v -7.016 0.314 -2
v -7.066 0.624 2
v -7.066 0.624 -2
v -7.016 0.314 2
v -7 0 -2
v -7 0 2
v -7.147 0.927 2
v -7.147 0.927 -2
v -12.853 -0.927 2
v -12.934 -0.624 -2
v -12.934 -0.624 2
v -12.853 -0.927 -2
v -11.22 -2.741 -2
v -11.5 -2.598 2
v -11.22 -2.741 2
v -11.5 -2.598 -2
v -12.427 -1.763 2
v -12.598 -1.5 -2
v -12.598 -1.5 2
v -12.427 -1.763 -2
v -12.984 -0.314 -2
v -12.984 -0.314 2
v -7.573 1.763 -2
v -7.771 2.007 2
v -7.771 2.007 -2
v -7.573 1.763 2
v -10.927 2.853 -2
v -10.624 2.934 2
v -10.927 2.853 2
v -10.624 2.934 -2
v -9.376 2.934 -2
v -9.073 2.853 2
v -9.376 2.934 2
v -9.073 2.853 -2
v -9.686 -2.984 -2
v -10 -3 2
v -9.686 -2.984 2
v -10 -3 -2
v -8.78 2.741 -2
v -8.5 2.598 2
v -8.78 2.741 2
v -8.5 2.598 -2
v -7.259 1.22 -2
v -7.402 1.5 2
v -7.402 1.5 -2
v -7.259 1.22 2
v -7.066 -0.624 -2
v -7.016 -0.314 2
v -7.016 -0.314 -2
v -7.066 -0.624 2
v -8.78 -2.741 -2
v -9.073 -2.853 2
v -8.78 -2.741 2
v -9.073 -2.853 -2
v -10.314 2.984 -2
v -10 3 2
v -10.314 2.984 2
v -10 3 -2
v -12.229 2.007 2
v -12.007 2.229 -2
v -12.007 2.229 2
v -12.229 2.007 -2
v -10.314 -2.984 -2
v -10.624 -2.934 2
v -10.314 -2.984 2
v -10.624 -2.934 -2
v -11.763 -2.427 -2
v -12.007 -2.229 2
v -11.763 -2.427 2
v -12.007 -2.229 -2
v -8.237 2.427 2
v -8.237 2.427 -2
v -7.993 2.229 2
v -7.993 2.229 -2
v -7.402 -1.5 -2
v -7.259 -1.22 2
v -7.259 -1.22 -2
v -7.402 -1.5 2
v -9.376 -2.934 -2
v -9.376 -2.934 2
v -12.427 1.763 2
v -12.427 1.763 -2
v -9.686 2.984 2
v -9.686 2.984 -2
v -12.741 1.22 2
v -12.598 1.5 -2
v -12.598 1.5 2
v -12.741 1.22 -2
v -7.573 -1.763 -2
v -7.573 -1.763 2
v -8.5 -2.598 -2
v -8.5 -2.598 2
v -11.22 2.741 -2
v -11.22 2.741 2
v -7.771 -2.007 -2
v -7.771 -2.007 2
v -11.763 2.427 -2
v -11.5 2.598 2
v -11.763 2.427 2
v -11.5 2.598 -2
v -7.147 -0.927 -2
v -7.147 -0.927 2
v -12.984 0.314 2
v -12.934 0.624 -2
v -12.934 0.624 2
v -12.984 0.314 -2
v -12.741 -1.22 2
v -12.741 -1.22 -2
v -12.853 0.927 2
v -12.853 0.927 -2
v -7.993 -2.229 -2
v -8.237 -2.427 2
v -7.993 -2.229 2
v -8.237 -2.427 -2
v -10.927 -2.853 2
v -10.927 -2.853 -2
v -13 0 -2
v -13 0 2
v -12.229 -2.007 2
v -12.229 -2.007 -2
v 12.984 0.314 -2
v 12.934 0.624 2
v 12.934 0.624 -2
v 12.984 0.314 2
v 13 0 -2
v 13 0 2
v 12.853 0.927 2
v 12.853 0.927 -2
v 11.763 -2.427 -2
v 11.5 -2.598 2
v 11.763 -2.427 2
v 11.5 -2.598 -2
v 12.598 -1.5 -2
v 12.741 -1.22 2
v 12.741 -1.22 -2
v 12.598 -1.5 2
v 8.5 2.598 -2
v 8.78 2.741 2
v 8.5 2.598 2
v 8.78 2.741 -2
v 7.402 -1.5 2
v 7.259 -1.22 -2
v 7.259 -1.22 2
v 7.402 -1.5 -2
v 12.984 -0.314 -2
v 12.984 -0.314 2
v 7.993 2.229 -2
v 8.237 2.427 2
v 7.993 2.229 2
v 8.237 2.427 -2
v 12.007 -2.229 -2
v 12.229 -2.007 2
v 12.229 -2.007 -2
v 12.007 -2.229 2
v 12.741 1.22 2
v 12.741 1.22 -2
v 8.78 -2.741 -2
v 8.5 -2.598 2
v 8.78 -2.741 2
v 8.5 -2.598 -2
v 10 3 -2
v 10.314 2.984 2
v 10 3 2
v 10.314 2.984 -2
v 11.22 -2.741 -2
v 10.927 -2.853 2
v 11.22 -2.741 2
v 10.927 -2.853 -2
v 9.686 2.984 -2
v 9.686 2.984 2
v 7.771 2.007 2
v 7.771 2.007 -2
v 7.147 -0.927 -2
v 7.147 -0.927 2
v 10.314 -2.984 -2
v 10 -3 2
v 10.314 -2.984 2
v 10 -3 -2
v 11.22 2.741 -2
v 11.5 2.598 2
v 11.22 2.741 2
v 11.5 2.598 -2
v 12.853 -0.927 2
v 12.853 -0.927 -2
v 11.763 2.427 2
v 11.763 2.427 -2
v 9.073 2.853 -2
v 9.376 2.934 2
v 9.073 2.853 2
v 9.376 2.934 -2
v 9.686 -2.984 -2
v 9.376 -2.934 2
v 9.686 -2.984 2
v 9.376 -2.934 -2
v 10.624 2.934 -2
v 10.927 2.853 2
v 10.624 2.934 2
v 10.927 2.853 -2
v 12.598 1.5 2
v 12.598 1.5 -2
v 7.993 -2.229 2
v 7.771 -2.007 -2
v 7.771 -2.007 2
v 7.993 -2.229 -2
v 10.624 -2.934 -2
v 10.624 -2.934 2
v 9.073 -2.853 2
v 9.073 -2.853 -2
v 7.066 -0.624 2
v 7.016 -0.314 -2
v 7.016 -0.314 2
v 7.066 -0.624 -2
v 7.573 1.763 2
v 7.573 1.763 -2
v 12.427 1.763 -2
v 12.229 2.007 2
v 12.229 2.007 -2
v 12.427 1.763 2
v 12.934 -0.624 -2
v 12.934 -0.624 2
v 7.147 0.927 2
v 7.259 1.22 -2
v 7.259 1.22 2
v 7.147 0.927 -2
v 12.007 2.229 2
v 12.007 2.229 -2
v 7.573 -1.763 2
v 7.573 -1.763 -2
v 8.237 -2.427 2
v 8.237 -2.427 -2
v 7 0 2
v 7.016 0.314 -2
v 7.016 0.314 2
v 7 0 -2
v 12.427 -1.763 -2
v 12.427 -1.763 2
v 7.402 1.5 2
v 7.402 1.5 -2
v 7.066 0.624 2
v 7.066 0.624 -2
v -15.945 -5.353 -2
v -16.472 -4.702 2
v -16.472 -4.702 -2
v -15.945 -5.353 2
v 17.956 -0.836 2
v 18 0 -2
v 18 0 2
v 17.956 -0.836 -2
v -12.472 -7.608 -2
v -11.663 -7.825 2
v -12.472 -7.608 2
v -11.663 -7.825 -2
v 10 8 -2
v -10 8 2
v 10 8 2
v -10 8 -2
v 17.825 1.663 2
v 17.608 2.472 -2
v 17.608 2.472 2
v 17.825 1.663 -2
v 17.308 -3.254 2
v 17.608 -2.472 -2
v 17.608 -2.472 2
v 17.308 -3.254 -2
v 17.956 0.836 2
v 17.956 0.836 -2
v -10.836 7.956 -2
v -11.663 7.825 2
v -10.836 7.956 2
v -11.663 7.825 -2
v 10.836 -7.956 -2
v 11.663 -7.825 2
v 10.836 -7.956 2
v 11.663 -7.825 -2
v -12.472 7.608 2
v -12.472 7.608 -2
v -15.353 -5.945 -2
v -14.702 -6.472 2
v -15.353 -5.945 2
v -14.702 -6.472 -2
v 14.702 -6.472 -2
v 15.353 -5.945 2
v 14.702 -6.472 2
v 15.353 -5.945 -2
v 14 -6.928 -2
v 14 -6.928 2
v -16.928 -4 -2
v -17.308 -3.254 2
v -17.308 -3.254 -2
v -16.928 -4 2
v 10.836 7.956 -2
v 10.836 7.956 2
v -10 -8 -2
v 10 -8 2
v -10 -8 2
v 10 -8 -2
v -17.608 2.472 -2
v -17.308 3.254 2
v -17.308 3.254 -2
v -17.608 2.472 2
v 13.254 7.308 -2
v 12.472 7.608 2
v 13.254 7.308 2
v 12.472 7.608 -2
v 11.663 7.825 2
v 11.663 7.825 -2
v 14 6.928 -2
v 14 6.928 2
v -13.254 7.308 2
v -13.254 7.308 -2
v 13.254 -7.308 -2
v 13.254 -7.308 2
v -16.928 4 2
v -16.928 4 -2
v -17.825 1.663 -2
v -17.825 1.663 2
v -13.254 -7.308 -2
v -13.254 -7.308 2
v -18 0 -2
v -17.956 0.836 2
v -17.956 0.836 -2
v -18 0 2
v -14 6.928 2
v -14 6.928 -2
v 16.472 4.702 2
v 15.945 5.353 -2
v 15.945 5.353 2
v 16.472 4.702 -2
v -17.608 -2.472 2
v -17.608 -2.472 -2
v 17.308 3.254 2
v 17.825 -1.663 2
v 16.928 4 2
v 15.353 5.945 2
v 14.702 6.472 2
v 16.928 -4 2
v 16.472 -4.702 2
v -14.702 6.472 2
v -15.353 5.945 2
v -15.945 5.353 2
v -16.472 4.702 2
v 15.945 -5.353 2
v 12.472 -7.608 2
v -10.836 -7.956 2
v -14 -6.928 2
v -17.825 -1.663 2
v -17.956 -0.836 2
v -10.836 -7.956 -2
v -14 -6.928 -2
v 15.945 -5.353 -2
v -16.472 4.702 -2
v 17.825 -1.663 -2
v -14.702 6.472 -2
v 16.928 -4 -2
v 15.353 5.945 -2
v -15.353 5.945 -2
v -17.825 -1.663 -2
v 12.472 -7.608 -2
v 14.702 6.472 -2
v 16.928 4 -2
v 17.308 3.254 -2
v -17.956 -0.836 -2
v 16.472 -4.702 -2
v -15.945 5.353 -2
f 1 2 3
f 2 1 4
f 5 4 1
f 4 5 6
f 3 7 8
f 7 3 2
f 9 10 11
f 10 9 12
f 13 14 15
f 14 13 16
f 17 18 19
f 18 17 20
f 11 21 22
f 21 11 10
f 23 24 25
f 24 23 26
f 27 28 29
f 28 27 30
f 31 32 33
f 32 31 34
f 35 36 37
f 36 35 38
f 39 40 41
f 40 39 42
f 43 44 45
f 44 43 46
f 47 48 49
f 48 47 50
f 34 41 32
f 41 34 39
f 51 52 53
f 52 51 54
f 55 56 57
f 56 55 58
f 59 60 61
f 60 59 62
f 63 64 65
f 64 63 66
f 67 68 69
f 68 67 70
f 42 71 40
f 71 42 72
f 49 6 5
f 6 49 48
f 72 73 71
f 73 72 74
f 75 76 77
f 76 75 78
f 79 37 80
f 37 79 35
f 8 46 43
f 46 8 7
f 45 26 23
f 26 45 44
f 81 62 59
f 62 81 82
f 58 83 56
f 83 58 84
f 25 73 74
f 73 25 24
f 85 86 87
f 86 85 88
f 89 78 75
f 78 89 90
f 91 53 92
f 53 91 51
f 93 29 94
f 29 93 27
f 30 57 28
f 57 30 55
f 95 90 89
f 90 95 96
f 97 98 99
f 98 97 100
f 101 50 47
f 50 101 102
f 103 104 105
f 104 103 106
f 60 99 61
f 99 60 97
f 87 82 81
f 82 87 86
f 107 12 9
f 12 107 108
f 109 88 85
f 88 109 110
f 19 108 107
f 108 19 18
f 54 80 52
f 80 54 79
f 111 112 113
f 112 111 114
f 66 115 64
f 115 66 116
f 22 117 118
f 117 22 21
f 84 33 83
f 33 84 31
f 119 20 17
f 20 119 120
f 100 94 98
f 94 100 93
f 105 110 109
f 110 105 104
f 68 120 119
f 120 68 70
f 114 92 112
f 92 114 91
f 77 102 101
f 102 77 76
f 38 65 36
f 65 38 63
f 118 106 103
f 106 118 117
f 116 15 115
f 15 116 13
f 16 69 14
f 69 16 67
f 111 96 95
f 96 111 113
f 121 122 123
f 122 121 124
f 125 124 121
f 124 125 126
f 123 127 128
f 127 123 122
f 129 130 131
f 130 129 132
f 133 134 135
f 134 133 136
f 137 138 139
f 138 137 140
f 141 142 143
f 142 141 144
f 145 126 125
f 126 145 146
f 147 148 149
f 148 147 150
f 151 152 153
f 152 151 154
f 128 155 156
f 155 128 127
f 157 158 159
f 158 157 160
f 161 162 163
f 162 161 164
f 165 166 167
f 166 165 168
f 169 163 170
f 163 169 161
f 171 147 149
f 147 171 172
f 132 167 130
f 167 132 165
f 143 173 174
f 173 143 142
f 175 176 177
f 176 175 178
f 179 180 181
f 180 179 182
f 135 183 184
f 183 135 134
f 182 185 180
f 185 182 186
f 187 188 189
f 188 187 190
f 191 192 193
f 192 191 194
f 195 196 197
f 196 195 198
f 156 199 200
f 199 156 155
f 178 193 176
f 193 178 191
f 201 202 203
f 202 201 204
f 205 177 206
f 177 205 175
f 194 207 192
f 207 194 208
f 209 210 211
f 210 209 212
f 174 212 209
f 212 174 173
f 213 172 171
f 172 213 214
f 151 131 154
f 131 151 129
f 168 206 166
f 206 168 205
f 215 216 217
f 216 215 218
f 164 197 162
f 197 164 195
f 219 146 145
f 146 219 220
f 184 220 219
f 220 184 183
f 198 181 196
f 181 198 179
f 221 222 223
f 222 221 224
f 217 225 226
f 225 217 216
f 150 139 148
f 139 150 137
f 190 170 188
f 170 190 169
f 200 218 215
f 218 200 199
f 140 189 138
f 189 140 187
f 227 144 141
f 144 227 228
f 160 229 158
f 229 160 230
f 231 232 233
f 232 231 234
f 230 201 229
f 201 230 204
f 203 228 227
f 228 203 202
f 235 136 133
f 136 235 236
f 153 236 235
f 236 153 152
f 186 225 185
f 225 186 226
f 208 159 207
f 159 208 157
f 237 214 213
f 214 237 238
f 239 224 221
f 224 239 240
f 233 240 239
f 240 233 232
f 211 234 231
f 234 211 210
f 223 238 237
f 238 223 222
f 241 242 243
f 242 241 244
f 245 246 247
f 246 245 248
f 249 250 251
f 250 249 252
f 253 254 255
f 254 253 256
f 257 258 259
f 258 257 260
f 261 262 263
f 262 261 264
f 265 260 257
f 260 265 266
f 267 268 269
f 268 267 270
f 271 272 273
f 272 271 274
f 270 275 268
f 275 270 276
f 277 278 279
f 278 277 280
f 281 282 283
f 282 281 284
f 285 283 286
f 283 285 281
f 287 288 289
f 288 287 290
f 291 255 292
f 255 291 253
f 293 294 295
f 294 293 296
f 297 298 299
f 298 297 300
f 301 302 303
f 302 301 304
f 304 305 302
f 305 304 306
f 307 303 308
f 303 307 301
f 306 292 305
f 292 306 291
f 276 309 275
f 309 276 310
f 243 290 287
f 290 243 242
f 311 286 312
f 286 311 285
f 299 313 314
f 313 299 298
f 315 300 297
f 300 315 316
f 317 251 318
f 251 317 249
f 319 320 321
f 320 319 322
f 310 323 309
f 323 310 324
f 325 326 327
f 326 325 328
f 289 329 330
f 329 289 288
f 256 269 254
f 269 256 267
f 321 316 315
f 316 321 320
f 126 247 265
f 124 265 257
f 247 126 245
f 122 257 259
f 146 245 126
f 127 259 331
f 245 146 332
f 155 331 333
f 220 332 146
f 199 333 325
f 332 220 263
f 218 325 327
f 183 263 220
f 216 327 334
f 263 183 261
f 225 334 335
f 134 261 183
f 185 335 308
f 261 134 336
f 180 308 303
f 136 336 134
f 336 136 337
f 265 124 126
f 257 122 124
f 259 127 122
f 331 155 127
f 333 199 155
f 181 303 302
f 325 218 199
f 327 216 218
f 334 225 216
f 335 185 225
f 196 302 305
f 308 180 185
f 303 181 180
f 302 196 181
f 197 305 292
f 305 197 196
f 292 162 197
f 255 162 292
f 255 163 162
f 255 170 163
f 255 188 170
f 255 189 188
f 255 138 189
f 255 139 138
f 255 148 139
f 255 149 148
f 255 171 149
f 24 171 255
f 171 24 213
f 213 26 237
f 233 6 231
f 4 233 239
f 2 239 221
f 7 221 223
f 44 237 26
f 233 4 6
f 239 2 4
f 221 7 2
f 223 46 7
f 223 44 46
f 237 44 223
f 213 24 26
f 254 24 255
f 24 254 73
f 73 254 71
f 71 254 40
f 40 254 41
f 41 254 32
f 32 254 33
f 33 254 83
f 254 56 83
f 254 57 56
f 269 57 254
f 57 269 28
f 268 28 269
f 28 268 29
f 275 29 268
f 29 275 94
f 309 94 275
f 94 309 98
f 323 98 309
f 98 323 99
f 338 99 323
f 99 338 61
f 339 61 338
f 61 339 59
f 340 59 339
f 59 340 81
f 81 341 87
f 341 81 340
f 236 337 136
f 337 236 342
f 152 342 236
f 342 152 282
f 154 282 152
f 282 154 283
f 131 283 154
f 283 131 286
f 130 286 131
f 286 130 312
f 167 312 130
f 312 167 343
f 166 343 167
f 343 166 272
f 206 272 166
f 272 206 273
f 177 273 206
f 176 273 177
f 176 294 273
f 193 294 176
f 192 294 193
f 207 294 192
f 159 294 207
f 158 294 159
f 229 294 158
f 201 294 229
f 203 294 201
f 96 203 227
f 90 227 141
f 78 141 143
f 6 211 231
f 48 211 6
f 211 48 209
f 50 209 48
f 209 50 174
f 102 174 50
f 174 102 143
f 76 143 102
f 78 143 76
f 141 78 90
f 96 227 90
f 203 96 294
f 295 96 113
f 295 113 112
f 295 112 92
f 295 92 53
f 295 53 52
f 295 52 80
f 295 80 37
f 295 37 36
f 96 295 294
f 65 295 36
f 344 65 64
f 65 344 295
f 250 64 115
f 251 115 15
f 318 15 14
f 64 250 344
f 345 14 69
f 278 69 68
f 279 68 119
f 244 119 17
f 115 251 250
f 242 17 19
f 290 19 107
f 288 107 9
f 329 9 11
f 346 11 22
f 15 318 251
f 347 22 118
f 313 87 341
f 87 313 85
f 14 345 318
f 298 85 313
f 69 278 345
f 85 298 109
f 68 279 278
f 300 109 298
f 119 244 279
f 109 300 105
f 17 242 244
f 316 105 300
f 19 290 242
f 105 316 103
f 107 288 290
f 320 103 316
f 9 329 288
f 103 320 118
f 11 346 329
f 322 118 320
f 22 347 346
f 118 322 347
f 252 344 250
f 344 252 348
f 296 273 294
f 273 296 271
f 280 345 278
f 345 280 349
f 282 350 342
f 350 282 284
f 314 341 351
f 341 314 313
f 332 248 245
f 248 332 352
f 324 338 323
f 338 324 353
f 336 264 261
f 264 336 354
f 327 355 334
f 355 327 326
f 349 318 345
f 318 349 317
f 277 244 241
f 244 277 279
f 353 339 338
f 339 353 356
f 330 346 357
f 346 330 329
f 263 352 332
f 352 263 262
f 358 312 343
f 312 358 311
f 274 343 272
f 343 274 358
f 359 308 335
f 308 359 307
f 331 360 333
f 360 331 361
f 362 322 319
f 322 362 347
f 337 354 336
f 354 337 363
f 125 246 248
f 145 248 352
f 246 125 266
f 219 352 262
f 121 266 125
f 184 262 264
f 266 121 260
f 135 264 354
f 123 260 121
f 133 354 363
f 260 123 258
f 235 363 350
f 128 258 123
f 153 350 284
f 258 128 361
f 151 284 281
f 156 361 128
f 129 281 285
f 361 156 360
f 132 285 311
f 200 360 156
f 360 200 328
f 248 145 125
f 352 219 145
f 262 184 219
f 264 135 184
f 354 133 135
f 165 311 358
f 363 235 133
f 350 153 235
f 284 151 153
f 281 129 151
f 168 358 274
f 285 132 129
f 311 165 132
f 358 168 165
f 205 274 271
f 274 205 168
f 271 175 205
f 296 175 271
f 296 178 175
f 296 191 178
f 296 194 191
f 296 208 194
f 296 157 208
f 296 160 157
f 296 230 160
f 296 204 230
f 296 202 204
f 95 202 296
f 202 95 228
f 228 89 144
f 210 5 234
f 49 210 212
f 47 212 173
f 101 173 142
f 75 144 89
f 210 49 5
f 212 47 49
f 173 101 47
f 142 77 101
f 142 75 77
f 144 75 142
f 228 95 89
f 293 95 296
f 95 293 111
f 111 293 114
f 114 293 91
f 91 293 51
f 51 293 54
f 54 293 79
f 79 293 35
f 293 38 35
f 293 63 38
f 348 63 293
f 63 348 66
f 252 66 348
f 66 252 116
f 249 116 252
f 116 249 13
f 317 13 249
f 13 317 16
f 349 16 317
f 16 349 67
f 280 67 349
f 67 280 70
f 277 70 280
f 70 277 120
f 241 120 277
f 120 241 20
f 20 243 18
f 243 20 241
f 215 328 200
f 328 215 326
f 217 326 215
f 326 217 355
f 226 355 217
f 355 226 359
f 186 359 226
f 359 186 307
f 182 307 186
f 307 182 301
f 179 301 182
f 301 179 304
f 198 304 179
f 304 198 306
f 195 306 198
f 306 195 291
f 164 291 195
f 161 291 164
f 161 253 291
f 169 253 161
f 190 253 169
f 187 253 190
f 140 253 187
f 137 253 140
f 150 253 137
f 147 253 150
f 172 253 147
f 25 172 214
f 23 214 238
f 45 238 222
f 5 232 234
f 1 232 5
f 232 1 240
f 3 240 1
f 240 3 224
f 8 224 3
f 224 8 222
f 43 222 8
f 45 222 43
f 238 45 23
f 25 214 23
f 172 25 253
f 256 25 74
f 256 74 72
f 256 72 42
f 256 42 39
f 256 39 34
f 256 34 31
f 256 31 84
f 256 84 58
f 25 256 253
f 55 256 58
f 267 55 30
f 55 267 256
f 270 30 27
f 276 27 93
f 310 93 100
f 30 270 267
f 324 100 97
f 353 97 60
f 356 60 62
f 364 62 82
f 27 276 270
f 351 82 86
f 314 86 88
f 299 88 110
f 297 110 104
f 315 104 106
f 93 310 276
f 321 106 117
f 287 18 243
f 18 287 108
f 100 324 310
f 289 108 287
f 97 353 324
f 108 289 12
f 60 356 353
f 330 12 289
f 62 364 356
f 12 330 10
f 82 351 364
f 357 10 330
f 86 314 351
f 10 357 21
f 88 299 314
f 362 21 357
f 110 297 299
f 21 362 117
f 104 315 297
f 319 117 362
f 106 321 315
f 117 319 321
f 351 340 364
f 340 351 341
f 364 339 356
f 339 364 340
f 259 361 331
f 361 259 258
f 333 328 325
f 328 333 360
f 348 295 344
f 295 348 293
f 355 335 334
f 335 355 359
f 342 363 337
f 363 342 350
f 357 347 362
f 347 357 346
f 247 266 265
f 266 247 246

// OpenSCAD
// Two-hole link plate.
$fn = 60;
eps = 0.02;
hole_d = 6;
length = 36;
width = 16;
thickness = 4;
difference() { hull() { translate([-length/2+width/2,0,0]) cylinder(d=width,h=thickness,center=true); translate([length/2-width/2,0,0]) cylinder(d=width,h=thickness,center=true); } for(x=[-length/2+width/2,length/2-width/2]) translate([x,0,-thickness/2-eps]) cylinder(d=hole_d,h=thickness+2*eps); }
